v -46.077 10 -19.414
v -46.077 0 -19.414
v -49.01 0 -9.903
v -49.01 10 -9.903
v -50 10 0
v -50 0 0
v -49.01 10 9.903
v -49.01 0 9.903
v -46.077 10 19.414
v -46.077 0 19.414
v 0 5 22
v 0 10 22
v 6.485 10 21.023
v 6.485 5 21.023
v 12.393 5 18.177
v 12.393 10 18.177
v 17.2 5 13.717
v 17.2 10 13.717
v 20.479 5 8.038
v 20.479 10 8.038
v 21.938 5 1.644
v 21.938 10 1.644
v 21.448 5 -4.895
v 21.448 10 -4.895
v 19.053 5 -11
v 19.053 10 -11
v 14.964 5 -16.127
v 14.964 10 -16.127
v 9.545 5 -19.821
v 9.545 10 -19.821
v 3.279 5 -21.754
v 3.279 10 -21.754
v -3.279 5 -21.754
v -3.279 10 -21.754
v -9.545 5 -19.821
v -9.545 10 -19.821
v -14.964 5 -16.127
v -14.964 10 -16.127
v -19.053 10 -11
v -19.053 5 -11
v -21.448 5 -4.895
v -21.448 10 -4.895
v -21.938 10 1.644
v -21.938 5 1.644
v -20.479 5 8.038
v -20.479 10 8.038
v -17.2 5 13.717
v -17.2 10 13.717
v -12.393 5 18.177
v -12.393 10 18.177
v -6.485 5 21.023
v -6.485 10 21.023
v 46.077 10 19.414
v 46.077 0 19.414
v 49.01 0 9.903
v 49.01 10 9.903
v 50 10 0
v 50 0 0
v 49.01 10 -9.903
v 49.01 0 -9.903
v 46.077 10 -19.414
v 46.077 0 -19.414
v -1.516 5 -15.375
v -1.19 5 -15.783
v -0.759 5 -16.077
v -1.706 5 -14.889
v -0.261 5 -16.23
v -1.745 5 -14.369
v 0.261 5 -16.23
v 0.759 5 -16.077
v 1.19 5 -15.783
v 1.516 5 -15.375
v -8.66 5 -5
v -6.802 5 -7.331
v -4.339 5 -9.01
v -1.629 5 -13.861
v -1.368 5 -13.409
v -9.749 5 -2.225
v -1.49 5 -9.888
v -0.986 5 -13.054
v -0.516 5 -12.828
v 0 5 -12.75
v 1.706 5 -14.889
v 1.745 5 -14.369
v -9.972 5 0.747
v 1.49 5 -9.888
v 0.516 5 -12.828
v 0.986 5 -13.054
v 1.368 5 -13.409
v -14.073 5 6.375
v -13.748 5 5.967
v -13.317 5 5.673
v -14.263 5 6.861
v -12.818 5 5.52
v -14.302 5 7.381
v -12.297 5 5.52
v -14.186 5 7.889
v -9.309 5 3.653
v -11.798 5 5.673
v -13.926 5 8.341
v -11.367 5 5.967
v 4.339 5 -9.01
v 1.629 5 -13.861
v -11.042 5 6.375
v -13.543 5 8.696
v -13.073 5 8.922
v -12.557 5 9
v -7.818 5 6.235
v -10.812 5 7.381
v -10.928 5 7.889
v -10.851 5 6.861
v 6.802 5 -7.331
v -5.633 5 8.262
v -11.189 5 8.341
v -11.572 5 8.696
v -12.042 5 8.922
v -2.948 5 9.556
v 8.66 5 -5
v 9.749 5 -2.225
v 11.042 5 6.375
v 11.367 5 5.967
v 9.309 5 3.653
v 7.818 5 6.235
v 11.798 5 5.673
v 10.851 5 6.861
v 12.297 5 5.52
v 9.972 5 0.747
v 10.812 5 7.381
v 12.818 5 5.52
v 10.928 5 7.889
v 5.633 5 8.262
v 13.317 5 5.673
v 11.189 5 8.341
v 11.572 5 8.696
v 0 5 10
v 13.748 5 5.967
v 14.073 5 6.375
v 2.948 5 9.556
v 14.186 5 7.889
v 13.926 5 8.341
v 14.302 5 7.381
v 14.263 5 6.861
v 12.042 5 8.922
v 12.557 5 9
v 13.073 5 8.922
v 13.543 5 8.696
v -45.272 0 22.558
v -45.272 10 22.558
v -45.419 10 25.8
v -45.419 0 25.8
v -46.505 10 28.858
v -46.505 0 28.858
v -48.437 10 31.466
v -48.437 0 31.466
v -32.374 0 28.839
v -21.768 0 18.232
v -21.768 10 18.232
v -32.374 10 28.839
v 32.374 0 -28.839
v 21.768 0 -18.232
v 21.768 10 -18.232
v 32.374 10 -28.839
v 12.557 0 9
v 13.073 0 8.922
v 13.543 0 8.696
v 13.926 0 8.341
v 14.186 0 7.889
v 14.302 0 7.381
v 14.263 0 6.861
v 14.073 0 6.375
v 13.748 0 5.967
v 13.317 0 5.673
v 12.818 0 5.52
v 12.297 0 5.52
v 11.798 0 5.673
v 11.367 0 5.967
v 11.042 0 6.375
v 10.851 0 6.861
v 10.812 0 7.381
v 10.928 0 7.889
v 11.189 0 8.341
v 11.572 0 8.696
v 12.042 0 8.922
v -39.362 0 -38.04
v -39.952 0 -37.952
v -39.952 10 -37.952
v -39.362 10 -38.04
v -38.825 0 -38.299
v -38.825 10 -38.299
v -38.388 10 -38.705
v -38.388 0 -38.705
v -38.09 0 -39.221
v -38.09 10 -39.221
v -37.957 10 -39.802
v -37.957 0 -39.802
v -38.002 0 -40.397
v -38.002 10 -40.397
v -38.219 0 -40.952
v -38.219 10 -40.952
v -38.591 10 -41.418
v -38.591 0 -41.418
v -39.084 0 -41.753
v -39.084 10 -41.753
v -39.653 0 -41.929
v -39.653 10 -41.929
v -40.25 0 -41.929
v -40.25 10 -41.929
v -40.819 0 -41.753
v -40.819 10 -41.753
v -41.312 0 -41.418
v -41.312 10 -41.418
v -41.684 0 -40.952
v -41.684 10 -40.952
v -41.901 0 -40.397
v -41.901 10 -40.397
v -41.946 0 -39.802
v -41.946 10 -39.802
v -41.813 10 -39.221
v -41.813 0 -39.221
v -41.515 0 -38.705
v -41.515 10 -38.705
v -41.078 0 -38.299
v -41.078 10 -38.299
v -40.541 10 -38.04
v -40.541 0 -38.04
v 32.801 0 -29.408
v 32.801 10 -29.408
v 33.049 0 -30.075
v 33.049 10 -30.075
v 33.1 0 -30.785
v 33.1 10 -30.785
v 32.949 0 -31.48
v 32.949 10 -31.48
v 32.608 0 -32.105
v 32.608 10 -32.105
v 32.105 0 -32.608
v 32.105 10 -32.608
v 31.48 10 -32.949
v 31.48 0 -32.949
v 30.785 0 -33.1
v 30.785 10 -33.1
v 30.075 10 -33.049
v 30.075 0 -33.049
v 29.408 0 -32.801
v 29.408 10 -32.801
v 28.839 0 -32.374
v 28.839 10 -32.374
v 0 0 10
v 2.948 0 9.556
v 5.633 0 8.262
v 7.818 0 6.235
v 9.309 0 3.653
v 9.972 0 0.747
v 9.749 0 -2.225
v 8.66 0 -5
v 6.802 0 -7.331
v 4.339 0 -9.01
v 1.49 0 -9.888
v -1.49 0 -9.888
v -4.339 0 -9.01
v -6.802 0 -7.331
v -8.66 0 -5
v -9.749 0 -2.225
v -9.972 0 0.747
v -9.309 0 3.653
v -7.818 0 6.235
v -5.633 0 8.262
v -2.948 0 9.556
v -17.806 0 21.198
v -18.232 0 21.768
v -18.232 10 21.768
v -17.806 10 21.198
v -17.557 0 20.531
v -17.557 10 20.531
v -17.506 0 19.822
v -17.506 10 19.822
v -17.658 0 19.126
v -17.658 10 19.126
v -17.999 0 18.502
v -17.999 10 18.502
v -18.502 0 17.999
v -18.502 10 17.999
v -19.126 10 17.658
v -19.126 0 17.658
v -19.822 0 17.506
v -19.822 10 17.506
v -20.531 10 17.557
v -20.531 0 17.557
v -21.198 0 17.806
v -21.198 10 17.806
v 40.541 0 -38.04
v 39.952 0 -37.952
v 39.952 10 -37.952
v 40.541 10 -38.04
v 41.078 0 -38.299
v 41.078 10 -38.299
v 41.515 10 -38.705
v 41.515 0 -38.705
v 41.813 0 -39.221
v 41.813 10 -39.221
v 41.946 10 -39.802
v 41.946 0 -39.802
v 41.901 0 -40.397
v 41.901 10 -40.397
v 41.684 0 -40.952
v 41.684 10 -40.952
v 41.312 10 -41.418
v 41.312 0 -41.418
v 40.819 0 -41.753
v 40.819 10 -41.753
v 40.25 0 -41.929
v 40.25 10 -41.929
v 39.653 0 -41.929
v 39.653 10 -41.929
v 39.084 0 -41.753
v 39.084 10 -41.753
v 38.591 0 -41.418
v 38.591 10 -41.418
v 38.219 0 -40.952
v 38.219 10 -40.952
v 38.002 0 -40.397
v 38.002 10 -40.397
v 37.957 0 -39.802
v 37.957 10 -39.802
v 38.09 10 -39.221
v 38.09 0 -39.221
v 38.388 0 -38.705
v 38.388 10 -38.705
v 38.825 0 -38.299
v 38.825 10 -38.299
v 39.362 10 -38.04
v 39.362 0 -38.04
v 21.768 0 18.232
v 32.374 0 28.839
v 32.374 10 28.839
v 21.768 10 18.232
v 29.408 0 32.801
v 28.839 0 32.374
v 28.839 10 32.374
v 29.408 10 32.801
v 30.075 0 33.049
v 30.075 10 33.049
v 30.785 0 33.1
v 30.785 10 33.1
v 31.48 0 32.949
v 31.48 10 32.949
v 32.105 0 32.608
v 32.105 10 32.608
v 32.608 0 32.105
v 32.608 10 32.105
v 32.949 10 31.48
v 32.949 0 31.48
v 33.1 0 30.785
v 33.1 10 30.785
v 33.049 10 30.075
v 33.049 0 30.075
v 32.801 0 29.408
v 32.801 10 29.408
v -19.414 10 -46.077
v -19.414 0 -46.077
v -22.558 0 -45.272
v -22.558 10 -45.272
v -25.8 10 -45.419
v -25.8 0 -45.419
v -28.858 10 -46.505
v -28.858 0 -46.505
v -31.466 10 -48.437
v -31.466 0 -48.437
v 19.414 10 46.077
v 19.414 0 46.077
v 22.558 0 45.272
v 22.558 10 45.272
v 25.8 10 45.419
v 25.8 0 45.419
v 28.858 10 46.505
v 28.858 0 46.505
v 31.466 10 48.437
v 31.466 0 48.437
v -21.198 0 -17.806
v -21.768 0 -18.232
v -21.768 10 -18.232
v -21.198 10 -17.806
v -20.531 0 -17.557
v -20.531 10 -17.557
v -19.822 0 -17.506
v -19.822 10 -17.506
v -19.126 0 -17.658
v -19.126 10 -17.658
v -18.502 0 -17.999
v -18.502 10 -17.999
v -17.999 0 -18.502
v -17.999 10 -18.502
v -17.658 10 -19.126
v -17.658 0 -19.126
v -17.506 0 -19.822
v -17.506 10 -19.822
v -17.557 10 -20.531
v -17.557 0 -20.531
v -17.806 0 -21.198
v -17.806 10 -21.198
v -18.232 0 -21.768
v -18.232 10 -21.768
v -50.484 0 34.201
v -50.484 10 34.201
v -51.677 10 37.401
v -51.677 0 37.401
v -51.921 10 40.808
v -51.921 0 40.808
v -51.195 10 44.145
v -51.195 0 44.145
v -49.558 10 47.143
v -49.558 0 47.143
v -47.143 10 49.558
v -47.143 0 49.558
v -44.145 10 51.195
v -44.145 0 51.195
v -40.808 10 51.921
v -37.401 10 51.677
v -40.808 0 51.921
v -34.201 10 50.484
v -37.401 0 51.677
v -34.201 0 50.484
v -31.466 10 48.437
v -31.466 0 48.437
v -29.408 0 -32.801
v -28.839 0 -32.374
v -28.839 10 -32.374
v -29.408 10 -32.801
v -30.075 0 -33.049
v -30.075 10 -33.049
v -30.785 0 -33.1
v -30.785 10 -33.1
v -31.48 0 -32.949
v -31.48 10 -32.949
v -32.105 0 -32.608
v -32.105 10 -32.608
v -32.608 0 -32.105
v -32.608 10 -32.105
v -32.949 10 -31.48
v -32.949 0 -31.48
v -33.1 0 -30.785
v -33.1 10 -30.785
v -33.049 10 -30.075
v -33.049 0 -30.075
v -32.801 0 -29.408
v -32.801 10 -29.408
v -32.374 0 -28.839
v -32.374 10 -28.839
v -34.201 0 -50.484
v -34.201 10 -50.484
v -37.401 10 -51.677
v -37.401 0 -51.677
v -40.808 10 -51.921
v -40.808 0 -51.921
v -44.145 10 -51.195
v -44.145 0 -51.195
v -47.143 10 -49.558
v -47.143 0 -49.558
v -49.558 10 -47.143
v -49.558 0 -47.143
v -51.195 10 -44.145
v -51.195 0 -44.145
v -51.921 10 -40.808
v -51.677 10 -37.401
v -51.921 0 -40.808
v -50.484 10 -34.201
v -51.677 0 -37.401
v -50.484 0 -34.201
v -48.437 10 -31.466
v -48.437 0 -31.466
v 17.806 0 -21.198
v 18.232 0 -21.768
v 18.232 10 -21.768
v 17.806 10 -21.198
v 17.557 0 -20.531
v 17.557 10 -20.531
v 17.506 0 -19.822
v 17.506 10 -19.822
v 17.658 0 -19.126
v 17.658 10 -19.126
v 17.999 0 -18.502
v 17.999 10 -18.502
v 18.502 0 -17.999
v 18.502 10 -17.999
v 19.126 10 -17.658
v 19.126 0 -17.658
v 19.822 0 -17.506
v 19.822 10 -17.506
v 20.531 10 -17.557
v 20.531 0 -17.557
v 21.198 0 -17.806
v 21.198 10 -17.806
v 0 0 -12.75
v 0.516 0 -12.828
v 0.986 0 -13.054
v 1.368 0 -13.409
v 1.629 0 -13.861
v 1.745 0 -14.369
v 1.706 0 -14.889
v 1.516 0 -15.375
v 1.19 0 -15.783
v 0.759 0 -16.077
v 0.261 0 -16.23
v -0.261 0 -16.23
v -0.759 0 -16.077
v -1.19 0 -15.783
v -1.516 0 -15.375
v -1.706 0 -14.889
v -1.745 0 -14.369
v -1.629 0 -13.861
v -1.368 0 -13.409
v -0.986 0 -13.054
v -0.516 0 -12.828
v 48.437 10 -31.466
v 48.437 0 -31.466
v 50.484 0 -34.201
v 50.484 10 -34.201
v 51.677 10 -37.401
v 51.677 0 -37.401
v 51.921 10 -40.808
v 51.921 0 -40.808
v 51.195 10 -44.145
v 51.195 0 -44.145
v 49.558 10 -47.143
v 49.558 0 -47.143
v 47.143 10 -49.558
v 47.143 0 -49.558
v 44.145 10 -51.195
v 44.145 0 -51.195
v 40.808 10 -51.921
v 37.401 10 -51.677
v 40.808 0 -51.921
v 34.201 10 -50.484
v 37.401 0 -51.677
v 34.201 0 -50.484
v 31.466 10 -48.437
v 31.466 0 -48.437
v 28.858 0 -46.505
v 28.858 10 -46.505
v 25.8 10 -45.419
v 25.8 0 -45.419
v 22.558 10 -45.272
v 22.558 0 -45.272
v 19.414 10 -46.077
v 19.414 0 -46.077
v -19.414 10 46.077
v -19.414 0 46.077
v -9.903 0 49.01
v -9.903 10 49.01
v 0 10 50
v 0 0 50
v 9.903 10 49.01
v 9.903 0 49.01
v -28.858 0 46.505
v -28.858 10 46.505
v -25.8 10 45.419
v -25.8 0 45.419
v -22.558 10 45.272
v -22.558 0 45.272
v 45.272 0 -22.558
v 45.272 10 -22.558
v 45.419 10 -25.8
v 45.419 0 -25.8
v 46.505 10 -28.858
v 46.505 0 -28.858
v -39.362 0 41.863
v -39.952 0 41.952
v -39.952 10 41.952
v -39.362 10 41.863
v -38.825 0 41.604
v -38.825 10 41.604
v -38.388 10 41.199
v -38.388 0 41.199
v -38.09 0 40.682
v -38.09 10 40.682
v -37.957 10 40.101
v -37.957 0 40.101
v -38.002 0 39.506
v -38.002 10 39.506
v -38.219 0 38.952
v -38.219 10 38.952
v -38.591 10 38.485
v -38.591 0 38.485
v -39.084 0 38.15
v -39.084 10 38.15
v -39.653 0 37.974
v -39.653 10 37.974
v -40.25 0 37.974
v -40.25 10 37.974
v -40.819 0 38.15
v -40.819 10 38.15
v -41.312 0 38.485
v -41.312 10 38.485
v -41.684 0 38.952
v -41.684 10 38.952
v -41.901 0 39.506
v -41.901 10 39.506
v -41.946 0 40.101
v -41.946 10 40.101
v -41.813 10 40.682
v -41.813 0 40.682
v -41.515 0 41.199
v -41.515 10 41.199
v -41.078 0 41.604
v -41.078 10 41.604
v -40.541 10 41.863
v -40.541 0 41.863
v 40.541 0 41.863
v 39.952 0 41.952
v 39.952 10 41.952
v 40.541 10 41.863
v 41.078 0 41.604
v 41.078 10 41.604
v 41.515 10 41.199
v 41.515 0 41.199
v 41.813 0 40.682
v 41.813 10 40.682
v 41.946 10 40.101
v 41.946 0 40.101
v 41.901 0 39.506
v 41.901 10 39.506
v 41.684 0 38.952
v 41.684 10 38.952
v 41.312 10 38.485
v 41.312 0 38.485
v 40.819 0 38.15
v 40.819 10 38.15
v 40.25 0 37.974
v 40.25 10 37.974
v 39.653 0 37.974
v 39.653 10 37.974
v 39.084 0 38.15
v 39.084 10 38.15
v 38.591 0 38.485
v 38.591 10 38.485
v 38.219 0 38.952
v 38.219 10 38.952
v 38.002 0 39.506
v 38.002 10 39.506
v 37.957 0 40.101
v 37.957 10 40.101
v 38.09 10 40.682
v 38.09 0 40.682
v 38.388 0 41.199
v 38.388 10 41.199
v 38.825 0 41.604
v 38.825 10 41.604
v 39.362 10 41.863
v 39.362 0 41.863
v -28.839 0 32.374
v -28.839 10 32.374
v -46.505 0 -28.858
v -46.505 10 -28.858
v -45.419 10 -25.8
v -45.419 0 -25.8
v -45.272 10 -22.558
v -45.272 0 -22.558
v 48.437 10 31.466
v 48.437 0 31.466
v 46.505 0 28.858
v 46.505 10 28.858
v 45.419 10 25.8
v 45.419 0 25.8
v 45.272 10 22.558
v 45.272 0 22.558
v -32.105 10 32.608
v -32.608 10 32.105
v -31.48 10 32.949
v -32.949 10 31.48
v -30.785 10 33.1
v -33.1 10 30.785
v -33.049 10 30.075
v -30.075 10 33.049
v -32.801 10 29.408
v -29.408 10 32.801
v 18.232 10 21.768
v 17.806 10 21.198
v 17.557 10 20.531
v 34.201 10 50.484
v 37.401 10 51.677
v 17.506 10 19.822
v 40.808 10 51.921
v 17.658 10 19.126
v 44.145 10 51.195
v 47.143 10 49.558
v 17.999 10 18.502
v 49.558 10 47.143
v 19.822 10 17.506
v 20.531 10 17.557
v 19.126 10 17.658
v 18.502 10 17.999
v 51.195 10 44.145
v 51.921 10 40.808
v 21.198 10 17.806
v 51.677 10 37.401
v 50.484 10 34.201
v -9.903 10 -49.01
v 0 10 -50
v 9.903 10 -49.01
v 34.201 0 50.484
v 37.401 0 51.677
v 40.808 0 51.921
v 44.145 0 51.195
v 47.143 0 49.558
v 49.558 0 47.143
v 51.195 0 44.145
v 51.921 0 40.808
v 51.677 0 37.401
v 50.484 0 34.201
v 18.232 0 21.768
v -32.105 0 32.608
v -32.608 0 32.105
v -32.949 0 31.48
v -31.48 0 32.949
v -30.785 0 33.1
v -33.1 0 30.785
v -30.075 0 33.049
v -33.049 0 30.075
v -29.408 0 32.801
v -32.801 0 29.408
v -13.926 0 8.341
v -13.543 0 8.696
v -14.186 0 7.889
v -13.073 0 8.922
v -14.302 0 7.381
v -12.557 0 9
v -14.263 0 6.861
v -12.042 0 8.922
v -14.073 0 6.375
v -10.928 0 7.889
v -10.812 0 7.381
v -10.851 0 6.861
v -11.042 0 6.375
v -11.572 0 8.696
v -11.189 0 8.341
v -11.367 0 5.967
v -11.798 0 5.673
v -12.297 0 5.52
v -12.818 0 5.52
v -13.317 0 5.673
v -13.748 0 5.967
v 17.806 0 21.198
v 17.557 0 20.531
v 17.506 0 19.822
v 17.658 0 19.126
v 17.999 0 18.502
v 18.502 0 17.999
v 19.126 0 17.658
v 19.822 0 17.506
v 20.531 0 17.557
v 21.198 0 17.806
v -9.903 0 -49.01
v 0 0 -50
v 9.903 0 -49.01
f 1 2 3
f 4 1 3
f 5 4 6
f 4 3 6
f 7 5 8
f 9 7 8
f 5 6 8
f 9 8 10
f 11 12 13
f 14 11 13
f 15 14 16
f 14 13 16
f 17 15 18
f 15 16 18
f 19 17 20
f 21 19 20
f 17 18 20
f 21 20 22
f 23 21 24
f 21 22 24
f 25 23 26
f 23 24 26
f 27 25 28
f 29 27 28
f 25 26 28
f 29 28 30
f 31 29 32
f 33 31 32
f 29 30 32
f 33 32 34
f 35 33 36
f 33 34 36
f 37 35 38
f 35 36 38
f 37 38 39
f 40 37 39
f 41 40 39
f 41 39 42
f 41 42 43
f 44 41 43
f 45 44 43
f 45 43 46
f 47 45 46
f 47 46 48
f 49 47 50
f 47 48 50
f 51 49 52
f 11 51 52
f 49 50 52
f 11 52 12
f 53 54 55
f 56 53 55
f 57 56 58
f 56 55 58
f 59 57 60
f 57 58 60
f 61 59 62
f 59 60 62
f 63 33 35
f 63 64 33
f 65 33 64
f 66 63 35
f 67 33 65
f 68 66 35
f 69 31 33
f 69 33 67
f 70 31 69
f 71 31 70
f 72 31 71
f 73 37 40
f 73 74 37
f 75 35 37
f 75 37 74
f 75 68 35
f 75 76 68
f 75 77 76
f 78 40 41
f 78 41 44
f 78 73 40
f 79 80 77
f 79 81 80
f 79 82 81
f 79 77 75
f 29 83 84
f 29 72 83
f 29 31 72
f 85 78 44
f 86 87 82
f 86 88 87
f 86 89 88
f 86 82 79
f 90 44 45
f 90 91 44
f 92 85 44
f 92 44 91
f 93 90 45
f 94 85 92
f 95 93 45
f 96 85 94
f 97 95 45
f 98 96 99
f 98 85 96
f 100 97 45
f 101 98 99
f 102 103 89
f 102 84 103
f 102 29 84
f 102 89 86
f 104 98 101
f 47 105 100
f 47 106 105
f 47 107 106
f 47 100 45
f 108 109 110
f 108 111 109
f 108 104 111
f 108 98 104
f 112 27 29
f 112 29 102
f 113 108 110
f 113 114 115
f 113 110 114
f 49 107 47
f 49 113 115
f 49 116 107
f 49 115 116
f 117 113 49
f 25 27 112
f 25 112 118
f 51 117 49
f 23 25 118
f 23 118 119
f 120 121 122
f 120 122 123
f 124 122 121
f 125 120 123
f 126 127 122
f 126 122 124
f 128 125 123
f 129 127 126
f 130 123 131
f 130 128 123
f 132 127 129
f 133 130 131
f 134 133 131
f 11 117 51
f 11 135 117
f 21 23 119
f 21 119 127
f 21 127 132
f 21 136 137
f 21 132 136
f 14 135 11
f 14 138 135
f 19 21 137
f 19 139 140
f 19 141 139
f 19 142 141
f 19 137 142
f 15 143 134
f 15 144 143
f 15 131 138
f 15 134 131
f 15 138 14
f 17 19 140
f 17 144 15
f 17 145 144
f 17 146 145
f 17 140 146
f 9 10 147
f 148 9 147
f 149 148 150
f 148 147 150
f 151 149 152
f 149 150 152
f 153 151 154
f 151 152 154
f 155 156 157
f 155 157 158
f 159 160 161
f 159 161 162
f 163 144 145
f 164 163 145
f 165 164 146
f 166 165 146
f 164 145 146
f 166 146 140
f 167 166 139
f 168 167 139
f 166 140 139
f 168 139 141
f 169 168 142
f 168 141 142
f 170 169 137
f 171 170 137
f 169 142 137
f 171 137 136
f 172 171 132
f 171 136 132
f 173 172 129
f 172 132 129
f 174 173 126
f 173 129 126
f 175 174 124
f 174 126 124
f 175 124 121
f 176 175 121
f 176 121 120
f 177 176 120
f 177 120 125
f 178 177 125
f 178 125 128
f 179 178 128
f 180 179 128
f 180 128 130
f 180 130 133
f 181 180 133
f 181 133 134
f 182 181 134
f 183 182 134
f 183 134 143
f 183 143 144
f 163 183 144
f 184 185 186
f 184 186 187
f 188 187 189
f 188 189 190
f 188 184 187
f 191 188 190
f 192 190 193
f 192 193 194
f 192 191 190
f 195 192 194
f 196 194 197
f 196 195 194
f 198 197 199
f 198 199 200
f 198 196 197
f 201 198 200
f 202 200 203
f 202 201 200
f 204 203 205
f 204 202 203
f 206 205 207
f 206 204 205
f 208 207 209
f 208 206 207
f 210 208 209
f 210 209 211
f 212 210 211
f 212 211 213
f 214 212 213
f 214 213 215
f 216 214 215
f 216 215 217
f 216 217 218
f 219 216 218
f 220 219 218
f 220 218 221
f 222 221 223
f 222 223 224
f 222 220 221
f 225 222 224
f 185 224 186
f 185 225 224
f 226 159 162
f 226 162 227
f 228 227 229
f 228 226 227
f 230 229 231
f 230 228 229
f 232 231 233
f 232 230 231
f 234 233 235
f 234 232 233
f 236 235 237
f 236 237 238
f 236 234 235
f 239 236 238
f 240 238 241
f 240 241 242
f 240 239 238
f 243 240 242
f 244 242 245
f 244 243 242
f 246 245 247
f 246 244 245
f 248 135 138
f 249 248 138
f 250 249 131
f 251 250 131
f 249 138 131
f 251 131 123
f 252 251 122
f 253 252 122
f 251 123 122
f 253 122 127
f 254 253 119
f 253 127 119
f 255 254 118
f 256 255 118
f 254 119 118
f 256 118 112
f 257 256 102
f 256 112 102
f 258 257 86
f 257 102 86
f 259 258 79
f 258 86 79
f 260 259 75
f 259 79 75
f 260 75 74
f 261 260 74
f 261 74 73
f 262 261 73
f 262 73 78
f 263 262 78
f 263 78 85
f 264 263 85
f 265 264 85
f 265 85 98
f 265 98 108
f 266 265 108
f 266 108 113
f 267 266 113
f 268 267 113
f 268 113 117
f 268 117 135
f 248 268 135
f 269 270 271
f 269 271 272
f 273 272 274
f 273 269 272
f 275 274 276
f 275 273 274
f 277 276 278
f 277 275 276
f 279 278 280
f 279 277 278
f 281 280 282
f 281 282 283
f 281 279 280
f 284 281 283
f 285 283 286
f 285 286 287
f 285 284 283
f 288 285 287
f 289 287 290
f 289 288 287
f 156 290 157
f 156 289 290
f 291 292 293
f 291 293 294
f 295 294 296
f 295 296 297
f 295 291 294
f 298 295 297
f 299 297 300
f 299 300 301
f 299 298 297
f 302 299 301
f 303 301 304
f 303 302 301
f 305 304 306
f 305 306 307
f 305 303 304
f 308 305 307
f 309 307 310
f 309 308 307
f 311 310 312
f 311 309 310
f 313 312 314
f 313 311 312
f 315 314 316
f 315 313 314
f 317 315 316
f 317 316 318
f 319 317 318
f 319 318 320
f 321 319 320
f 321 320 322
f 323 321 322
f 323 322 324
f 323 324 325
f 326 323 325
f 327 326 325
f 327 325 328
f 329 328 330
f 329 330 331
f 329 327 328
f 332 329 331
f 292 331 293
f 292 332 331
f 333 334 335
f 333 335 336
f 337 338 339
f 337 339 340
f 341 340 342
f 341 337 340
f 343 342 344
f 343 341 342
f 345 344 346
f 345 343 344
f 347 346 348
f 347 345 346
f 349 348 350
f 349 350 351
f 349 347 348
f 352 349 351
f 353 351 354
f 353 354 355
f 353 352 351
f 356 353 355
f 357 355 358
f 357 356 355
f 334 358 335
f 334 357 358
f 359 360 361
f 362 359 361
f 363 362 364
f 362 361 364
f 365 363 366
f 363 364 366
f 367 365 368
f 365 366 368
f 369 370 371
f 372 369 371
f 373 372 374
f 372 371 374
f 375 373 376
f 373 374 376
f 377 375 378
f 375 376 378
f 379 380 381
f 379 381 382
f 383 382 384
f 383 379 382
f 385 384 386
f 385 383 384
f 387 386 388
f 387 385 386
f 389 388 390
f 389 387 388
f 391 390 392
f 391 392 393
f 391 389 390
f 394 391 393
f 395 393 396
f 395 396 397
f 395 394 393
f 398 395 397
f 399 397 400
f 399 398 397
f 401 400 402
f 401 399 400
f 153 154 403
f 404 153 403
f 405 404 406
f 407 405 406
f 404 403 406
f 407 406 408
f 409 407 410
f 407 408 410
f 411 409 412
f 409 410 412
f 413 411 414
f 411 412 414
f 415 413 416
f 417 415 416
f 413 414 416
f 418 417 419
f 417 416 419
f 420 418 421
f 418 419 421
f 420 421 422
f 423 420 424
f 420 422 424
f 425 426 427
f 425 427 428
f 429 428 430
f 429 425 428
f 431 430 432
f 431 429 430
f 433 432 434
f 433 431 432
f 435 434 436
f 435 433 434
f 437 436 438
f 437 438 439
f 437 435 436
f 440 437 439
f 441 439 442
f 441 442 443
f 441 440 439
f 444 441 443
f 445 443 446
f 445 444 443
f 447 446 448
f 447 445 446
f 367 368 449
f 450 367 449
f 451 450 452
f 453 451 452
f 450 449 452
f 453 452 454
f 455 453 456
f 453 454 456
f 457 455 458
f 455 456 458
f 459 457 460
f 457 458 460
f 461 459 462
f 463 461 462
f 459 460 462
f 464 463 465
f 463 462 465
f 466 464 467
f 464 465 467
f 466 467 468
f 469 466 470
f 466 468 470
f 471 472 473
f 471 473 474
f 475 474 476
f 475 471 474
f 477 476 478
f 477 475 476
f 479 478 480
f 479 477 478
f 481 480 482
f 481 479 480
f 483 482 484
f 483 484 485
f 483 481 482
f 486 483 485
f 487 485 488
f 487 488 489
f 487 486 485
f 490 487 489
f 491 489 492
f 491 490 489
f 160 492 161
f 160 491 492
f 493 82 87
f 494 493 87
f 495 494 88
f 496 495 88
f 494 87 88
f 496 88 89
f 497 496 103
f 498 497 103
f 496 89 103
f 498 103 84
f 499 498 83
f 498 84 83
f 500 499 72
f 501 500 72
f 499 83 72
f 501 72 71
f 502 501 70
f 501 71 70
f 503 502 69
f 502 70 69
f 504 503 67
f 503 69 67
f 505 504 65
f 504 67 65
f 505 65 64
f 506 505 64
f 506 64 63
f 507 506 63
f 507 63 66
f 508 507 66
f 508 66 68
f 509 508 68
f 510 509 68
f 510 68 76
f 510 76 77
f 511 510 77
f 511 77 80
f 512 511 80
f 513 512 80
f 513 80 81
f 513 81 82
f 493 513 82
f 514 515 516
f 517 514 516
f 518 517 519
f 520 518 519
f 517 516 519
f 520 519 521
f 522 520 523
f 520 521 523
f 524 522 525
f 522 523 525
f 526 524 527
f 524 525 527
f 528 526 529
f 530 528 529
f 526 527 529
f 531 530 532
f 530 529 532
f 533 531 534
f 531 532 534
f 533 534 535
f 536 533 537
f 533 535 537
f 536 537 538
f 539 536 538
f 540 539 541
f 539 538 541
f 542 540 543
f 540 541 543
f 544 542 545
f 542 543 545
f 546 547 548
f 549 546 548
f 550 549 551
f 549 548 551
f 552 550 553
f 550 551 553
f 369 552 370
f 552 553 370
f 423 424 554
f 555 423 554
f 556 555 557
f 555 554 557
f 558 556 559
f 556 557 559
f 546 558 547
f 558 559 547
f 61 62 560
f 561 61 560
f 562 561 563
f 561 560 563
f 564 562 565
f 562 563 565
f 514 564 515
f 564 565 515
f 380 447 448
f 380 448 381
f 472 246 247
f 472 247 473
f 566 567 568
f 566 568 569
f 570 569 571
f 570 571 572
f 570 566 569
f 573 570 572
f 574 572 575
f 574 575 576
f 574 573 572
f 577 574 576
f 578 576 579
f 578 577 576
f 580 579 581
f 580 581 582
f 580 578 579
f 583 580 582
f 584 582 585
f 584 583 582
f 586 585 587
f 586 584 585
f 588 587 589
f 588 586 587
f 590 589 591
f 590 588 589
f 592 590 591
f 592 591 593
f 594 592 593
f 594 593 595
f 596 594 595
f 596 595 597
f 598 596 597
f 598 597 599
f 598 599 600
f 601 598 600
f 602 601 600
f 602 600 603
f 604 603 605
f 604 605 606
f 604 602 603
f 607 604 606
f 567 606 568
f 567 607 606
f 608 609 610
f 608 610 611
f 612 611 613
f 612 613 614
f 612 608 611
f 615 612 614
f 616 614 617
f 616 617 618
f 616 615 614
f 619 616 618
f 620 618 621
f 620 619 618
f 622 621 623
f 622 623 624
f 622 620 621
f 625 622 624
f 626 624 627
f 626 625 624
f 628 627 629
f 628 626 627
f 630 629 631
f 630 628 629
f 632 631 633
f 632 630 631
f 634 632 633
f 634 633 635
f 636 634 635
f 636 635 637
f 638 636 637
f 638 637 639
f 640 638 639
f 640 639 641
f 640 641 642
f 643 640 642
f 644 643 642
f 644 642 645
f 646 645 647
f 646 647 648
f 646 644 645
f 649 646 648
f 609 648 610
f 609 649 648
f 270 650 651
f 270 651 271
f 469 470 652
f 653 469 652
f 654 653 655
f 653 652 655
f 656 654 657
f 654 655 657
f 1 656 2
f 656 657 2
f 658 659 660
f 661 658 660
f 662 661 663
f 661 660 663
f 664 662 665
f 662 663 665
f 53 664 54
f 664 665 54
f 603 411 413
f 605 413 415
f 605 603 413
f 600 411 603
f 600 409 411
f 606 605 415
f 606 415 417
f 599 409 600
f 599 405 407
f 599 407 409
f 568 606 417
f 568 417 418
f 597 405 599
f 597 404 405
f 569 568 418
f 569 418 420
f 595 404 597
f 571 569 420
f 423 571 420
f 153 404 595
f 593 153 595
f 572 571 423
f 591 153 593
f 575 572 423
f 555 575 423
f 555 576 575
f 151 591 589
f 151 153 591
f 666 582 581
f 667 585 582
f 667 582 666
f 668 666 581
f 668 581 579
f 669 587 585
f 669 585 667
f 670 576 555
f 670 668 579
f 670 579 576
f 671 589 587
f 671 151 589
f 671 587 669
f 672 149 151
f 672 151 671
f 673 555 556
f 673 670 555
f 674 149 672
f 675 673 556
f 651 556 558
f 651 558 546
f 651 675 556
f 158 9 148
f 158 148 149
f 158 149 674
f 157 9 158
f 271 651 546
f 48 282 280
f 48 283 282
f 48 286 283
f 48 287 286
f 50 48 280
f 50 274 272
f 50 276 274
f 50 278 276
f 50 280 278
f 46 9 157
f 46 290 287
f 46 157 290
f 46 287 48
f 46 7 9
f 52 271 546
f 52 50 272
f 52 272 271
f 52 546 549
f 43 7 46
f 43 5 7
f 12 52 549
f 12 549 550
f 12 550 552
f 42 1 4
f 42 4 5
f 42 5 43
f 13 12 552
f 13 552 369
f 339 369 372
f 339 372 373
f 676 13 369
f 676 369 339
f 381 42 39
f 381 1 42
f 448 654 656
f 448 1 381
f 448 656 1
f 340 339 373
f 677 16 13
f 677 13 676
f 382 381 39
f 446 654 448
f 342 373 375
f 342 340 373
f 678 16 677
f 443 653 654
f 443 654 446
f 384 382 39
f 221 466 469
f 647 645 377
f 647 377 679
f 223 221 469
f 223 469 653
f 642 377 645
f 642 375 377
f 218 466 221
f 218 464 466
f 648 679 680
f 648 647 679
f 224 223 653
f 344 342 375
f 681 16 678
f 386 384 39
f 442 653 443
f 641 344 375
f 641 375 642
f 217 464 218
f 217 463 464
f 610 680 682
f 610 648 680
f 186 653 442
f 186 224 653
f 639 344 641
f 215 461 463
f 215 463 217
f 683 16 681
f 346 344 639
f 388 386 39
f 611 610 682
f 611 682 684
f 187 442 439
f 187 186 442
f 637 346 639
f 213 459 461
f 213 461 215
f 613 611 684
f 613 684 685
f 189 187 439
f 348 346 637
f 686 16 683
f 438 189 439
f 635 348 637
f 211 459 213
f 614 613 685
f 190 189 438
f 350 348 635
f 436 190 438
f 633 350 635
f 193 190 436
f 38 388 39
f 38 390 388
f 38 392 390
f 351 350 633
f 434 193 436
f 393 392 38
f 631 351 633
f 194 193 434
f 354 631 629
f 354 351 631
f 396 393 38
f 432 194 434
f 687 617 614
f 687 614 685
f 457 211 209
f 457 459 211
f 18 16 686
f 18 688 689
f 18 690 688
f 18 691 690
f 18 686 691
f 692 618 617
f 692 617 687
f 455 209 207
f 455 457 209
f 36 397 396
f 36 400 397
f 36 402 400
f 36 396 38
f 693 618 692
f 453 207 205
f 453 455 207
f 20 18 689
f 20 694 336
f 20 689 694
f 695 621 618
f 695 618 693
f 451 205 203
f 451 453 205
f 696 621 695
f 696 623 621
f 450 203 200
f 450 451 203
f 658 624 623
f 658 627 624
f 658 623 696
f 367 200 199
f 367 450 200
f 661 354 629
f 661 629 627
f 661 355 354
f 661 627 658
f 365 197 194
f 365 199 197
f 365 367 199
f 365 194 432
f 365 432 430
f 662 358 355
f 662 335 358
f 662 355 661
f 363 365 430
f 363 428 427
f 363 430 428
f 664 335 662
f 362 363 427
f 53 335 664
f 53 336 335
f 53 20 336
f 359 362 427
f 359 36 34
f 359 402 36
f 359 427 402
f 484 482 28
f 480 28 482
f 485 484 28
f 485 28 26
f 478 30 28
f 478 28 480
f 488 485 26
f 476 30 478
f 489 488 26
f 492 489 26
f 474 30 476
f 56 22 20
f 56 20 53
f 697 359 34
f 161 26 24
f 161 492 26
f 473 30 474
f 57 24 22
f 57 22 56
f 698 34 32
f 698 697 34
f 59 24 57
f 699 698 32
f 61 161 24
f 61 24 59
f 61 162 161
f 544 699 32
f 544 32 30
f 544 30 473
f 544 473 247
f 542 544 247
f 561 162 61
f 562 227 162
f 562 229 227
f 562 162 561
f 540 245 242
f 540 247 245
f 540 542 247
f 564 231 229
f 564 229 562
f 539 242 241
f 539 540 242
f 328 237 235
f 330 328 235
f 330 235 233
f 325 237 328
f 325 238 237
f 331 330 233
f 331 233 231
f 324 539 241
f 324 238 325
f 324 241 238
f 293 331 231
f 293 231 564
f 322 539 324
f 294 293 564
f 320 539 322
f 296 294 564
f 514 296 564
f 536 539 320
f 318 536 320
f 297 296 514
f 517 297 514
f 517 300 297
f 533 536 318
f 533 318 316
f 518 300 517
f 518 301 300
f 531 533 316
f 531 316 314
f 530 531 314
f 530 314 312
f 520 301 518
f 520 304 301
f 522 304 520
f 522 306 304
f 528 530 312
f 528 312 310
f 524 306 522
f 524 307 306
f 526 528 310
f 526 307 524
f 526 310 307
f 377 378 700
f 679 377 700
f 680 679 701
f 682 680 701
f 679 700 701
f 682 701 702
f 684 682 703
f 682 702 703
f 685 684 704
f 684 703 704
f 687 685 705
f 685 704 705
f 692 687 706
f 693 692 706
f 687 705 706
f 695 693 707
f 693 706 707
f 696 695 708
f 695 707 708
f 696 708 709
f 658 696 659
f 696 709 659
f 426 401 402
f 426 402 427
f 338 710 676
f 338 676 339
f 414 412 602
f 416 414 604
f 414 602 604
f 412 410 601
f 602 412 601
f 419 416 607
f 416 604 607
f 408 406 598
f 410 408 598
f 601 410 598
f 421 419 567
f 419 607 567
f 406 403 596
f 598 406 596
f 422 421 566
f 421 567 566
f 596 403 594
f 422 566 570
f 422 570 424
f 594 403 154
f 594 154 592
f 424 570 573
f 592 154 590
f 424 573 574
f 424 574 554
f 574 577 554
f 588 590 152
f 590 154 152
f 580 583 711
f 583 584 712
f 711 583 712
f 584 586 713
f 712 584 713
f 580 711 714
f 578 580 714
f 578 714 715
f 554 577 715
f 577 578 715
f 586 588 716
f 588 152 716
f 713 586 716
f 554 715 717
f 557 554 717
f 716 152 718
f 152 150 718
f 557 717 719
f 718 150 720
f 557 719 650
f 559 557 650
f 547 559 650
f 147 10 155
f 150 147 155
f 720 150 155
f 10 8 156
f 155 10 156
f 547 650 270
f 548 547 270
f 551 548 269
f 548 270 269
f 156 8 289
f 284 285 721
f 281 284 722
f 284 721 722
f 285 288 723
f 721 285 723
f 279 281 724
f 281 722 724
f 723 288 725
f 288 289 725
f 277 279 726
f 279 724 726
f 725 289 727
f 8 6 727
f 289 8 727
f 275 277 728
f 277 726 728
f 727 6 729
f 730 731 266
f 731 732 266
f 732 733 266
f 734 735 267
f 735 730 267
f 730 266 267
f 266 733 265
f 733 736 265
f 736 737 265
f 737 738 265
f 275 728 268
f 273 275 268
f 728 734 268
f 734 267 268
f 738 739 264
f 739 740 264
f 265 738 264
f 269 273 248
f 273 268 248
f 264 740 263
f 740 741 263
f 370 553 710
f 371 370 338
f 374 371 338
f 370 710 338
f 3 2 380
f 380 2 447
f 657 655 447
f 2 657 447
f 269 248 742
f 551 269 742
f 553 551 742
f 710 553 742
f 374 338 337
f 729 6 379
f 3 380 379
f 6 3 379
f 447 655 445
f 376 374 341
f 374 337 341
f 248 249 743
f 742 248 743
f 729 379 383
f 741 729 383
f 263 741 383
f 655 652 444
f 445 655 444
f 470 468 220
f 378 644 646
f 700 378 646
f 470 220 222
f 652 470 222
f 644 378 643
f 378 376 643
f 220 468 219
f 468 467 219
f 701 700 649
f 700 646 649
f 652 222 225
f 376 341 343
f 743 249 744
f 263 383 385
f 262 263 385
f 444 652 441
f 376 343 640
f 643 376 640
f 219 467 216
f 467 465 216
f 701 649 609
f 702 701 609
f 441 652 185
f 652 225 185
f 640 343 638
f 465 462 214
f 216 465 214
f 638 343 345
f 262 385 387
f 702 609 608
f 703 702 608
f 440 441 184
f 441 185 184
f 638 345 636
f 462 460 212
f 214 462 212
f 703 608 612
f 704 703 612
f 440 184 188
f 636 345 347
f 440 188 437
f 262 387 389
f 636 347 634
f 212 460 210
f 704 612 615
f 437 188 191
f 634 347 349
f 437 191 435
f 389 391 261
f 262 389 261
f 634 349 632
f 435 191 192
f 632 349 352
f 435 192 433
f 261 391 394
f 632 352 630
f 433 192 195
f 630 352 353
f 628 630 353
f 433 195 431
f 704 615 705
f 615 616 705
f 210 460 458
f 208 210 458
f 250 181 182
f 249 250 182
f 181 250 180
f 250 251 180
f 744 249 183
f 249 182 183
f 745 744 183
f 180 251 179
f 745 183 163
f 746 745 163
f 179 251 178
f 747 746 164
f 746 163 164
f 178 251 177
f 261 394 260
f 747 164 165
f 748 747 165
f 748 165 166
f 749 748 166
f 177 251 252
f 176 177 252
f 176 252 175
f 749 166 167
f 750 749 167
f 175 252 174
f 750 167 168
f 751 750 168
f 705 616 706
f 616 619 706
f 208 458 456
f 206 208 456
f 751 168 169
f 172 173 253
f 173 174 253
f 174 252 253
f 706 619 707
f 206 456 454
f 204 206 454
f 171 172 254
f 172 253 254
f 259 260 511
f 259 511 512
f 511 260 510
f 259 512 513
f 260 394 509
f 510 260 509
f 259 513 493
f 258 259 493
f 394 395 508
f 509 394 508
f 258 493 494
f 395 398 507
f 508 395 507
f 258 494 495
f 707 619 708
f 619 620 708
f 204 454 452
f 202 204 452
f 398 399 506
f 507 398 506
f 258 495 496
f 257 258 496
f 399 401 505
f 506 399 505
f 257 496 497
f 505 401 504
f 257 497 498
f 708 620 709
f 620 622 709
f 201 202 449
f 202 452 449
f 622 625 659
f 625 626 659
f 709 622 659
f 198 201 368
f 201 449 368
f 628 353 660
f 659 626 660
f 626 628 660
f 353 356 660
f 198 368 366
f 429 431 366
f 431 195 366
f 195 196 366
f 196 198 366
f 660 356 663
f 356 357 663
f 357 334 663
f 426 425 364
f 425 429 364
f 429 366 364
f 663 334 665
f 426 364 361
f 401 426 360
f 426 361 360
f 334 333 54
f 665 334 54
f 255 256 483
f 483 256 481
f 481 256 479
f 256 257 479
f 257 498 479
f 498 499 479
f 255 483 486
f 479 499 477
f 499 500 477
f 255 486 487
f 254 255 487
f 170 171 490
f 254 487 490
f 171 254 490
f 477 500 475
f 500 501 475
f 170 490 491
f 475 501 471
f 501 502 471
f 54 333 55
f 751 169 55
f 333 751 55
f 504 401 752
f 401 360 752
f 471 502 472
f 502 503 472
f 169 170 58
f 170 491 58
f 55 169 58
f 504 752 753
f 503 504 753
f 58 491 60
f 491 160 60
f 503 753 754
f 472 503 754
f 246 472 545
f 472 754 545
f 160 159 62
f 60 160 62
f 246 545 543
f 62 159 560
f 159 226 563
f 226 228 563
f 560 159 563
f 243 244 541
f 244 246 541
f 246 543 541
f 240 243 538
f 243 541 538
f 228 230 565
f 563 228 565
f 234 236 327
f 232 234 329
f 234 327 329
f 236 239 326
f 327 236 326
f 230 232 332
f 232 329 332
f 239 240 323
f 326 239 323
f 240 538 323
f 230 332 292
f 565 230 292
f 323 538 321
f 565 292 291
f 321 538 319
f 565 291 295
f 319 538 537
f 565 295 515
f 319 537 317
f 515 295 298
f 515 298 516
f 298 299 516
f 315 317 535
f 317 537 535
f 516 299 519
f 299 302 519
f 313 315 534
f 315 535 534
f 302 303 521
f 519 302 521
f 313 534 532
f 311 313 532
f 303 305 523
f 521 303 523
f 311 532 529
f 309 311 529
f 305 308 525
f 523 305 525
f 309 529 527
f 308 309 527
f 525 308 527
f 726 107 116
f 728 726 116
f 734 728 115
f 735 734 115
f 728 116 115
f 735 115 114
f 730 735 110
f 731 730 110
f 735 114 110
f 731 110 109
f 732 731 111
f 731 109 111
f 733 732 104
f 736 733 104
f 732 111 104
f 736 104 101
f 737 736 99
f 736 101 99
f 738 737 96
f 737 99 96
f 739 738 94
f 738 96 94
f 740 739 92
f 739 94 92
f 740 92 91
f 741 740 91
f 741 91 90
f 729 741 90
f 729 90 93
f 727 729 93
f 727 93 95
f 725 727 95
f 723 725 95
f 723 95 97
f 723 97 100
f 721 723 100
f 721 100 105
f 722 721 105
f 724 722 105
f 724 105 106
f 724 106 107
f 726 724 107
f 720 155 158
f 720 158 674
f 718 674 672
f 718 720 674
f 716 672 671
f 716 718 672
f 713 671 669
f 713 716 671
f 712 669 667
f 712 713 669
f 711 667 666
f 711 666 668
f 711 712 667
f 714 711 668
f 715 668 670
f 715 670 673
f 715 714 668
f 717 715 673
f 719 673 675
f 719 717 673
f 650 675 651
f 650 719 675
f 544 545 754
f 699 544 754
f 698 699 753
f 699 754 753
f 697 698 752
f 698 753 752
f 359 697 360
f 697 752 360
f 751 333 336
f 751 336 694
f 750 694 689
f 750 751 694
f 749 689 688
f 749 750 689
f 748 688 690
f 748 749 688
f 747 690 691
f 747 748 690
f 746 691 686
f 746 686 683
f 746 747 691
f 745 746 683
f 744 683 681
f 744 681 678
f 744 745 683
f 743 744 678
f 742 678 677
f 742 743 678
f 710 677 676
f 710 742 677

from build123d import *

# Parameters (mm, degrees)
SKETCH_1_R          = 2
EXTRUDE_1_DEPTH     = 10
SKETCH_2_R          = 22
SKETCH_2_R_2        = 10
CUT_EXTRUDE_1_DEPTH = 5
SKETCH_2_3_R        = 1.75
SKETCH_2_3_R_2      = 10
CUT_EXTRUDE_2_DEPTH = 75.1479844


with BuildPart() as part:
    # 草图1 → 凸台-拉伸1 (new body)
    with BuildSketch(Plane(origin=(0, 0, 0), x_dir=(1, 0, 0), z_dir=(0, 1, 0))):
        with BuildLine():
            ThreePointArc((46.077281732, -19.413503243), (50, 0), (46.077281732, 19.413503243))
            ThreePointArc((46.077281732, 19.413503243), (45.41900176, 25.799706685), (48.436814511, 31.466251763))
            ThreePointArc((48.436814511, 31.466251763), (48.436814511, 48.436814511), (31.466251763, 48.436814511))
            ThreePointArc((31.466251763, 48.436814511), (25.799706685, 45.41900176), (19.413503243, 46.077281732))
            ThreePointArc((19.413503243, 46.077281732), (0, 50), (-19.413503243, 46.077281732))
            ThreePointArc((-19.413503243, 46.077281732), (-25.799706685, 45.41900176), (-31.466251763, 48.436814511))
            ThreePointArc((-31.466251763, 48.436814511), (-48.436814511, 48.436814511), (-48.436814511, 31.466251763))
            ThreePointArc((-48.436814511, 31.466251763), (-45.41900176, 25.799706685), (-46.077281732, 19.413503243))
            ThreePointArc((-46.077281732, 19.413503243), (-50, 0), (-46.077281732, -19.413503243))
            ThreePointArc((-46.077281732, -19.413503243), (-45.41900176, -25.799706685), (-48.436814511, -31.466251763))
            ThreePointArc((-48.436814511, -31.466251763), (-48.436814511, -48.436814511), (-31.466251763, -48.436814511))
            ThreePointArc((-31.466251763, -48.436814511), (-25.799706685, -45.41900176), (-19.413503243, -46.077281732))
            ThreePointArc((-19.413503243, -46.077281732), (0, -50), (19.413503243, -46.077281732))
            ThreePointArc((19.413503243, -46.077281732), (25.799706685, -45.41900176), (31.466251763, -48.436814511))
            ThreePointArc((31.466251763, -48.436814511), (48.436814511, -48.436814511), (48.436814511, -31.466251763))
            ThreePointArc((48.436814511, -31.466251763), (45.41900176, -25.799706685), (46.077281732, -19.413503243))
        make_face()
        with BuildLine():
            ThreePointArc((-21.767766953, -18.232233047), (-18.232233047, -18.232233047), (-18.232233047, -21.767766953))
            Line((-18.232233047, -21.767766953), (-28.838834765, -32.374368671))
            ThreePointArc((-28.838834765, -32.374368671), (-32.374368671, -32.374368671), (-32.374368671, -28.838834765))
            Line((-32.374368671, -28.838834765), (-21.767766953, -18.232233047))
        make_face(mode=Mode.SUBTRACT)
        with BuildLine():
            ThreePointArc((18.232233047, -21.767766953), (18.232233047, -18.232233047), (21.767766953, -18.232233047))
            Line((21.767766953, -18.232233047), (32.374368671, -28.838834765))
            ThreePointArc((32.374368671, -28.838834765), (32.374368671, -32.374368671), (28.838834765, -32.374368671))
            Line((28.838834765, -32.374368671), (18.232233047, -21.767766953))
        make_face(mode=Mode.SUBTRACT)
        with BuildLine():
            ThreePointArc((-18.232233047, 21.767766953), (-18.232233047, 18.232233047), (-21.767766953, 18.232233047))
            Line((-21.767766953, 18.232233047), (-32.374368671, 28.838834765))
            ThreePointArc((-32.374368671, 28.838834765), (-32.374368671, 32.374368671), (-28.838834765, 32.374368671))
            Line((-28.838834765, 32.374368671), (-18.232233047, 21.767766953))
        make_face(mode=Mode.SUBTRACT)
        with BuildLine():
            ThreePointArc((21.767766953, 18.232233047), (18.232233047, 18.232233047), (18.232233047, 21.767766953))
            Line((18.232233047, 21.767766953), (28.838834765, 32.374368671))
            ThreePointArc((28.838834765, 32.374368671), (32.374368671, 32.374368671), (32.374368671, 28.838834765))
            Line((32.374368671, 28.838834765), (21.767766953, 18.232233047))
        make_face(mode=Mode.SUBTRACT)
        with Locations((39.951533137, -39.951533137)):
            Circle(SKETCH_1_R, mode=Mode.SUBTRACT)
        with Locations((-39.951533137, -39.951533137)):
            Circle(SKETCH_1_R, mode=Mode.SUBTRACT)
        with Locations((-39.951533137, 39.951533137)):
            Circle(SKETCH_1_R, mode=Mode.SUBTRACT)
        with Locations((39.951533137, 39.951533137)):
            Circle(SKETCH_1_R, mode=Mode.SUBTRACT)
    extrude(amount=EXTRUDE_1_DEPTH)

    # 草图2 → 切除-拉伸1 (cut)
    with BuildSketch(Plane(origin=(0, 10, 0), x_dir=(1, 0, 0), z_dir=(0, 1, 0))):
        Circle(SKETCH_2_R)
        Circle(SKETCH_2_R_2, mode=Mode.SUBTRACT)
    extrude(amount=-CUT_EXTRUDE_1_DEPTH, mode=Mode.SUBTRACT)

    # 草图2<3> → 切除-拉伸2 (cut, through all)
    with BuildSketch(Plane(origin=(0, 10, 0), x_dir=(1, 0, 0), z_dir=(0, 1, 0))):
        with Locations((0, 14.5)):
            Circle(SKETCH_2_3_R)
        with Locations((12.557368355, -7.25)):
            Circle(SKETCH_2_3_R)
        with Locations((-12.557368355, -7.25)):
            Circle(SKETCH_2_3_R)
        Circle(SKETCH_2_3_R_2)
    extrude(amount=-CUT_EXTRUDE_2_DEPTH, mode=Mode.SUBTRACT)


solid = part.part
